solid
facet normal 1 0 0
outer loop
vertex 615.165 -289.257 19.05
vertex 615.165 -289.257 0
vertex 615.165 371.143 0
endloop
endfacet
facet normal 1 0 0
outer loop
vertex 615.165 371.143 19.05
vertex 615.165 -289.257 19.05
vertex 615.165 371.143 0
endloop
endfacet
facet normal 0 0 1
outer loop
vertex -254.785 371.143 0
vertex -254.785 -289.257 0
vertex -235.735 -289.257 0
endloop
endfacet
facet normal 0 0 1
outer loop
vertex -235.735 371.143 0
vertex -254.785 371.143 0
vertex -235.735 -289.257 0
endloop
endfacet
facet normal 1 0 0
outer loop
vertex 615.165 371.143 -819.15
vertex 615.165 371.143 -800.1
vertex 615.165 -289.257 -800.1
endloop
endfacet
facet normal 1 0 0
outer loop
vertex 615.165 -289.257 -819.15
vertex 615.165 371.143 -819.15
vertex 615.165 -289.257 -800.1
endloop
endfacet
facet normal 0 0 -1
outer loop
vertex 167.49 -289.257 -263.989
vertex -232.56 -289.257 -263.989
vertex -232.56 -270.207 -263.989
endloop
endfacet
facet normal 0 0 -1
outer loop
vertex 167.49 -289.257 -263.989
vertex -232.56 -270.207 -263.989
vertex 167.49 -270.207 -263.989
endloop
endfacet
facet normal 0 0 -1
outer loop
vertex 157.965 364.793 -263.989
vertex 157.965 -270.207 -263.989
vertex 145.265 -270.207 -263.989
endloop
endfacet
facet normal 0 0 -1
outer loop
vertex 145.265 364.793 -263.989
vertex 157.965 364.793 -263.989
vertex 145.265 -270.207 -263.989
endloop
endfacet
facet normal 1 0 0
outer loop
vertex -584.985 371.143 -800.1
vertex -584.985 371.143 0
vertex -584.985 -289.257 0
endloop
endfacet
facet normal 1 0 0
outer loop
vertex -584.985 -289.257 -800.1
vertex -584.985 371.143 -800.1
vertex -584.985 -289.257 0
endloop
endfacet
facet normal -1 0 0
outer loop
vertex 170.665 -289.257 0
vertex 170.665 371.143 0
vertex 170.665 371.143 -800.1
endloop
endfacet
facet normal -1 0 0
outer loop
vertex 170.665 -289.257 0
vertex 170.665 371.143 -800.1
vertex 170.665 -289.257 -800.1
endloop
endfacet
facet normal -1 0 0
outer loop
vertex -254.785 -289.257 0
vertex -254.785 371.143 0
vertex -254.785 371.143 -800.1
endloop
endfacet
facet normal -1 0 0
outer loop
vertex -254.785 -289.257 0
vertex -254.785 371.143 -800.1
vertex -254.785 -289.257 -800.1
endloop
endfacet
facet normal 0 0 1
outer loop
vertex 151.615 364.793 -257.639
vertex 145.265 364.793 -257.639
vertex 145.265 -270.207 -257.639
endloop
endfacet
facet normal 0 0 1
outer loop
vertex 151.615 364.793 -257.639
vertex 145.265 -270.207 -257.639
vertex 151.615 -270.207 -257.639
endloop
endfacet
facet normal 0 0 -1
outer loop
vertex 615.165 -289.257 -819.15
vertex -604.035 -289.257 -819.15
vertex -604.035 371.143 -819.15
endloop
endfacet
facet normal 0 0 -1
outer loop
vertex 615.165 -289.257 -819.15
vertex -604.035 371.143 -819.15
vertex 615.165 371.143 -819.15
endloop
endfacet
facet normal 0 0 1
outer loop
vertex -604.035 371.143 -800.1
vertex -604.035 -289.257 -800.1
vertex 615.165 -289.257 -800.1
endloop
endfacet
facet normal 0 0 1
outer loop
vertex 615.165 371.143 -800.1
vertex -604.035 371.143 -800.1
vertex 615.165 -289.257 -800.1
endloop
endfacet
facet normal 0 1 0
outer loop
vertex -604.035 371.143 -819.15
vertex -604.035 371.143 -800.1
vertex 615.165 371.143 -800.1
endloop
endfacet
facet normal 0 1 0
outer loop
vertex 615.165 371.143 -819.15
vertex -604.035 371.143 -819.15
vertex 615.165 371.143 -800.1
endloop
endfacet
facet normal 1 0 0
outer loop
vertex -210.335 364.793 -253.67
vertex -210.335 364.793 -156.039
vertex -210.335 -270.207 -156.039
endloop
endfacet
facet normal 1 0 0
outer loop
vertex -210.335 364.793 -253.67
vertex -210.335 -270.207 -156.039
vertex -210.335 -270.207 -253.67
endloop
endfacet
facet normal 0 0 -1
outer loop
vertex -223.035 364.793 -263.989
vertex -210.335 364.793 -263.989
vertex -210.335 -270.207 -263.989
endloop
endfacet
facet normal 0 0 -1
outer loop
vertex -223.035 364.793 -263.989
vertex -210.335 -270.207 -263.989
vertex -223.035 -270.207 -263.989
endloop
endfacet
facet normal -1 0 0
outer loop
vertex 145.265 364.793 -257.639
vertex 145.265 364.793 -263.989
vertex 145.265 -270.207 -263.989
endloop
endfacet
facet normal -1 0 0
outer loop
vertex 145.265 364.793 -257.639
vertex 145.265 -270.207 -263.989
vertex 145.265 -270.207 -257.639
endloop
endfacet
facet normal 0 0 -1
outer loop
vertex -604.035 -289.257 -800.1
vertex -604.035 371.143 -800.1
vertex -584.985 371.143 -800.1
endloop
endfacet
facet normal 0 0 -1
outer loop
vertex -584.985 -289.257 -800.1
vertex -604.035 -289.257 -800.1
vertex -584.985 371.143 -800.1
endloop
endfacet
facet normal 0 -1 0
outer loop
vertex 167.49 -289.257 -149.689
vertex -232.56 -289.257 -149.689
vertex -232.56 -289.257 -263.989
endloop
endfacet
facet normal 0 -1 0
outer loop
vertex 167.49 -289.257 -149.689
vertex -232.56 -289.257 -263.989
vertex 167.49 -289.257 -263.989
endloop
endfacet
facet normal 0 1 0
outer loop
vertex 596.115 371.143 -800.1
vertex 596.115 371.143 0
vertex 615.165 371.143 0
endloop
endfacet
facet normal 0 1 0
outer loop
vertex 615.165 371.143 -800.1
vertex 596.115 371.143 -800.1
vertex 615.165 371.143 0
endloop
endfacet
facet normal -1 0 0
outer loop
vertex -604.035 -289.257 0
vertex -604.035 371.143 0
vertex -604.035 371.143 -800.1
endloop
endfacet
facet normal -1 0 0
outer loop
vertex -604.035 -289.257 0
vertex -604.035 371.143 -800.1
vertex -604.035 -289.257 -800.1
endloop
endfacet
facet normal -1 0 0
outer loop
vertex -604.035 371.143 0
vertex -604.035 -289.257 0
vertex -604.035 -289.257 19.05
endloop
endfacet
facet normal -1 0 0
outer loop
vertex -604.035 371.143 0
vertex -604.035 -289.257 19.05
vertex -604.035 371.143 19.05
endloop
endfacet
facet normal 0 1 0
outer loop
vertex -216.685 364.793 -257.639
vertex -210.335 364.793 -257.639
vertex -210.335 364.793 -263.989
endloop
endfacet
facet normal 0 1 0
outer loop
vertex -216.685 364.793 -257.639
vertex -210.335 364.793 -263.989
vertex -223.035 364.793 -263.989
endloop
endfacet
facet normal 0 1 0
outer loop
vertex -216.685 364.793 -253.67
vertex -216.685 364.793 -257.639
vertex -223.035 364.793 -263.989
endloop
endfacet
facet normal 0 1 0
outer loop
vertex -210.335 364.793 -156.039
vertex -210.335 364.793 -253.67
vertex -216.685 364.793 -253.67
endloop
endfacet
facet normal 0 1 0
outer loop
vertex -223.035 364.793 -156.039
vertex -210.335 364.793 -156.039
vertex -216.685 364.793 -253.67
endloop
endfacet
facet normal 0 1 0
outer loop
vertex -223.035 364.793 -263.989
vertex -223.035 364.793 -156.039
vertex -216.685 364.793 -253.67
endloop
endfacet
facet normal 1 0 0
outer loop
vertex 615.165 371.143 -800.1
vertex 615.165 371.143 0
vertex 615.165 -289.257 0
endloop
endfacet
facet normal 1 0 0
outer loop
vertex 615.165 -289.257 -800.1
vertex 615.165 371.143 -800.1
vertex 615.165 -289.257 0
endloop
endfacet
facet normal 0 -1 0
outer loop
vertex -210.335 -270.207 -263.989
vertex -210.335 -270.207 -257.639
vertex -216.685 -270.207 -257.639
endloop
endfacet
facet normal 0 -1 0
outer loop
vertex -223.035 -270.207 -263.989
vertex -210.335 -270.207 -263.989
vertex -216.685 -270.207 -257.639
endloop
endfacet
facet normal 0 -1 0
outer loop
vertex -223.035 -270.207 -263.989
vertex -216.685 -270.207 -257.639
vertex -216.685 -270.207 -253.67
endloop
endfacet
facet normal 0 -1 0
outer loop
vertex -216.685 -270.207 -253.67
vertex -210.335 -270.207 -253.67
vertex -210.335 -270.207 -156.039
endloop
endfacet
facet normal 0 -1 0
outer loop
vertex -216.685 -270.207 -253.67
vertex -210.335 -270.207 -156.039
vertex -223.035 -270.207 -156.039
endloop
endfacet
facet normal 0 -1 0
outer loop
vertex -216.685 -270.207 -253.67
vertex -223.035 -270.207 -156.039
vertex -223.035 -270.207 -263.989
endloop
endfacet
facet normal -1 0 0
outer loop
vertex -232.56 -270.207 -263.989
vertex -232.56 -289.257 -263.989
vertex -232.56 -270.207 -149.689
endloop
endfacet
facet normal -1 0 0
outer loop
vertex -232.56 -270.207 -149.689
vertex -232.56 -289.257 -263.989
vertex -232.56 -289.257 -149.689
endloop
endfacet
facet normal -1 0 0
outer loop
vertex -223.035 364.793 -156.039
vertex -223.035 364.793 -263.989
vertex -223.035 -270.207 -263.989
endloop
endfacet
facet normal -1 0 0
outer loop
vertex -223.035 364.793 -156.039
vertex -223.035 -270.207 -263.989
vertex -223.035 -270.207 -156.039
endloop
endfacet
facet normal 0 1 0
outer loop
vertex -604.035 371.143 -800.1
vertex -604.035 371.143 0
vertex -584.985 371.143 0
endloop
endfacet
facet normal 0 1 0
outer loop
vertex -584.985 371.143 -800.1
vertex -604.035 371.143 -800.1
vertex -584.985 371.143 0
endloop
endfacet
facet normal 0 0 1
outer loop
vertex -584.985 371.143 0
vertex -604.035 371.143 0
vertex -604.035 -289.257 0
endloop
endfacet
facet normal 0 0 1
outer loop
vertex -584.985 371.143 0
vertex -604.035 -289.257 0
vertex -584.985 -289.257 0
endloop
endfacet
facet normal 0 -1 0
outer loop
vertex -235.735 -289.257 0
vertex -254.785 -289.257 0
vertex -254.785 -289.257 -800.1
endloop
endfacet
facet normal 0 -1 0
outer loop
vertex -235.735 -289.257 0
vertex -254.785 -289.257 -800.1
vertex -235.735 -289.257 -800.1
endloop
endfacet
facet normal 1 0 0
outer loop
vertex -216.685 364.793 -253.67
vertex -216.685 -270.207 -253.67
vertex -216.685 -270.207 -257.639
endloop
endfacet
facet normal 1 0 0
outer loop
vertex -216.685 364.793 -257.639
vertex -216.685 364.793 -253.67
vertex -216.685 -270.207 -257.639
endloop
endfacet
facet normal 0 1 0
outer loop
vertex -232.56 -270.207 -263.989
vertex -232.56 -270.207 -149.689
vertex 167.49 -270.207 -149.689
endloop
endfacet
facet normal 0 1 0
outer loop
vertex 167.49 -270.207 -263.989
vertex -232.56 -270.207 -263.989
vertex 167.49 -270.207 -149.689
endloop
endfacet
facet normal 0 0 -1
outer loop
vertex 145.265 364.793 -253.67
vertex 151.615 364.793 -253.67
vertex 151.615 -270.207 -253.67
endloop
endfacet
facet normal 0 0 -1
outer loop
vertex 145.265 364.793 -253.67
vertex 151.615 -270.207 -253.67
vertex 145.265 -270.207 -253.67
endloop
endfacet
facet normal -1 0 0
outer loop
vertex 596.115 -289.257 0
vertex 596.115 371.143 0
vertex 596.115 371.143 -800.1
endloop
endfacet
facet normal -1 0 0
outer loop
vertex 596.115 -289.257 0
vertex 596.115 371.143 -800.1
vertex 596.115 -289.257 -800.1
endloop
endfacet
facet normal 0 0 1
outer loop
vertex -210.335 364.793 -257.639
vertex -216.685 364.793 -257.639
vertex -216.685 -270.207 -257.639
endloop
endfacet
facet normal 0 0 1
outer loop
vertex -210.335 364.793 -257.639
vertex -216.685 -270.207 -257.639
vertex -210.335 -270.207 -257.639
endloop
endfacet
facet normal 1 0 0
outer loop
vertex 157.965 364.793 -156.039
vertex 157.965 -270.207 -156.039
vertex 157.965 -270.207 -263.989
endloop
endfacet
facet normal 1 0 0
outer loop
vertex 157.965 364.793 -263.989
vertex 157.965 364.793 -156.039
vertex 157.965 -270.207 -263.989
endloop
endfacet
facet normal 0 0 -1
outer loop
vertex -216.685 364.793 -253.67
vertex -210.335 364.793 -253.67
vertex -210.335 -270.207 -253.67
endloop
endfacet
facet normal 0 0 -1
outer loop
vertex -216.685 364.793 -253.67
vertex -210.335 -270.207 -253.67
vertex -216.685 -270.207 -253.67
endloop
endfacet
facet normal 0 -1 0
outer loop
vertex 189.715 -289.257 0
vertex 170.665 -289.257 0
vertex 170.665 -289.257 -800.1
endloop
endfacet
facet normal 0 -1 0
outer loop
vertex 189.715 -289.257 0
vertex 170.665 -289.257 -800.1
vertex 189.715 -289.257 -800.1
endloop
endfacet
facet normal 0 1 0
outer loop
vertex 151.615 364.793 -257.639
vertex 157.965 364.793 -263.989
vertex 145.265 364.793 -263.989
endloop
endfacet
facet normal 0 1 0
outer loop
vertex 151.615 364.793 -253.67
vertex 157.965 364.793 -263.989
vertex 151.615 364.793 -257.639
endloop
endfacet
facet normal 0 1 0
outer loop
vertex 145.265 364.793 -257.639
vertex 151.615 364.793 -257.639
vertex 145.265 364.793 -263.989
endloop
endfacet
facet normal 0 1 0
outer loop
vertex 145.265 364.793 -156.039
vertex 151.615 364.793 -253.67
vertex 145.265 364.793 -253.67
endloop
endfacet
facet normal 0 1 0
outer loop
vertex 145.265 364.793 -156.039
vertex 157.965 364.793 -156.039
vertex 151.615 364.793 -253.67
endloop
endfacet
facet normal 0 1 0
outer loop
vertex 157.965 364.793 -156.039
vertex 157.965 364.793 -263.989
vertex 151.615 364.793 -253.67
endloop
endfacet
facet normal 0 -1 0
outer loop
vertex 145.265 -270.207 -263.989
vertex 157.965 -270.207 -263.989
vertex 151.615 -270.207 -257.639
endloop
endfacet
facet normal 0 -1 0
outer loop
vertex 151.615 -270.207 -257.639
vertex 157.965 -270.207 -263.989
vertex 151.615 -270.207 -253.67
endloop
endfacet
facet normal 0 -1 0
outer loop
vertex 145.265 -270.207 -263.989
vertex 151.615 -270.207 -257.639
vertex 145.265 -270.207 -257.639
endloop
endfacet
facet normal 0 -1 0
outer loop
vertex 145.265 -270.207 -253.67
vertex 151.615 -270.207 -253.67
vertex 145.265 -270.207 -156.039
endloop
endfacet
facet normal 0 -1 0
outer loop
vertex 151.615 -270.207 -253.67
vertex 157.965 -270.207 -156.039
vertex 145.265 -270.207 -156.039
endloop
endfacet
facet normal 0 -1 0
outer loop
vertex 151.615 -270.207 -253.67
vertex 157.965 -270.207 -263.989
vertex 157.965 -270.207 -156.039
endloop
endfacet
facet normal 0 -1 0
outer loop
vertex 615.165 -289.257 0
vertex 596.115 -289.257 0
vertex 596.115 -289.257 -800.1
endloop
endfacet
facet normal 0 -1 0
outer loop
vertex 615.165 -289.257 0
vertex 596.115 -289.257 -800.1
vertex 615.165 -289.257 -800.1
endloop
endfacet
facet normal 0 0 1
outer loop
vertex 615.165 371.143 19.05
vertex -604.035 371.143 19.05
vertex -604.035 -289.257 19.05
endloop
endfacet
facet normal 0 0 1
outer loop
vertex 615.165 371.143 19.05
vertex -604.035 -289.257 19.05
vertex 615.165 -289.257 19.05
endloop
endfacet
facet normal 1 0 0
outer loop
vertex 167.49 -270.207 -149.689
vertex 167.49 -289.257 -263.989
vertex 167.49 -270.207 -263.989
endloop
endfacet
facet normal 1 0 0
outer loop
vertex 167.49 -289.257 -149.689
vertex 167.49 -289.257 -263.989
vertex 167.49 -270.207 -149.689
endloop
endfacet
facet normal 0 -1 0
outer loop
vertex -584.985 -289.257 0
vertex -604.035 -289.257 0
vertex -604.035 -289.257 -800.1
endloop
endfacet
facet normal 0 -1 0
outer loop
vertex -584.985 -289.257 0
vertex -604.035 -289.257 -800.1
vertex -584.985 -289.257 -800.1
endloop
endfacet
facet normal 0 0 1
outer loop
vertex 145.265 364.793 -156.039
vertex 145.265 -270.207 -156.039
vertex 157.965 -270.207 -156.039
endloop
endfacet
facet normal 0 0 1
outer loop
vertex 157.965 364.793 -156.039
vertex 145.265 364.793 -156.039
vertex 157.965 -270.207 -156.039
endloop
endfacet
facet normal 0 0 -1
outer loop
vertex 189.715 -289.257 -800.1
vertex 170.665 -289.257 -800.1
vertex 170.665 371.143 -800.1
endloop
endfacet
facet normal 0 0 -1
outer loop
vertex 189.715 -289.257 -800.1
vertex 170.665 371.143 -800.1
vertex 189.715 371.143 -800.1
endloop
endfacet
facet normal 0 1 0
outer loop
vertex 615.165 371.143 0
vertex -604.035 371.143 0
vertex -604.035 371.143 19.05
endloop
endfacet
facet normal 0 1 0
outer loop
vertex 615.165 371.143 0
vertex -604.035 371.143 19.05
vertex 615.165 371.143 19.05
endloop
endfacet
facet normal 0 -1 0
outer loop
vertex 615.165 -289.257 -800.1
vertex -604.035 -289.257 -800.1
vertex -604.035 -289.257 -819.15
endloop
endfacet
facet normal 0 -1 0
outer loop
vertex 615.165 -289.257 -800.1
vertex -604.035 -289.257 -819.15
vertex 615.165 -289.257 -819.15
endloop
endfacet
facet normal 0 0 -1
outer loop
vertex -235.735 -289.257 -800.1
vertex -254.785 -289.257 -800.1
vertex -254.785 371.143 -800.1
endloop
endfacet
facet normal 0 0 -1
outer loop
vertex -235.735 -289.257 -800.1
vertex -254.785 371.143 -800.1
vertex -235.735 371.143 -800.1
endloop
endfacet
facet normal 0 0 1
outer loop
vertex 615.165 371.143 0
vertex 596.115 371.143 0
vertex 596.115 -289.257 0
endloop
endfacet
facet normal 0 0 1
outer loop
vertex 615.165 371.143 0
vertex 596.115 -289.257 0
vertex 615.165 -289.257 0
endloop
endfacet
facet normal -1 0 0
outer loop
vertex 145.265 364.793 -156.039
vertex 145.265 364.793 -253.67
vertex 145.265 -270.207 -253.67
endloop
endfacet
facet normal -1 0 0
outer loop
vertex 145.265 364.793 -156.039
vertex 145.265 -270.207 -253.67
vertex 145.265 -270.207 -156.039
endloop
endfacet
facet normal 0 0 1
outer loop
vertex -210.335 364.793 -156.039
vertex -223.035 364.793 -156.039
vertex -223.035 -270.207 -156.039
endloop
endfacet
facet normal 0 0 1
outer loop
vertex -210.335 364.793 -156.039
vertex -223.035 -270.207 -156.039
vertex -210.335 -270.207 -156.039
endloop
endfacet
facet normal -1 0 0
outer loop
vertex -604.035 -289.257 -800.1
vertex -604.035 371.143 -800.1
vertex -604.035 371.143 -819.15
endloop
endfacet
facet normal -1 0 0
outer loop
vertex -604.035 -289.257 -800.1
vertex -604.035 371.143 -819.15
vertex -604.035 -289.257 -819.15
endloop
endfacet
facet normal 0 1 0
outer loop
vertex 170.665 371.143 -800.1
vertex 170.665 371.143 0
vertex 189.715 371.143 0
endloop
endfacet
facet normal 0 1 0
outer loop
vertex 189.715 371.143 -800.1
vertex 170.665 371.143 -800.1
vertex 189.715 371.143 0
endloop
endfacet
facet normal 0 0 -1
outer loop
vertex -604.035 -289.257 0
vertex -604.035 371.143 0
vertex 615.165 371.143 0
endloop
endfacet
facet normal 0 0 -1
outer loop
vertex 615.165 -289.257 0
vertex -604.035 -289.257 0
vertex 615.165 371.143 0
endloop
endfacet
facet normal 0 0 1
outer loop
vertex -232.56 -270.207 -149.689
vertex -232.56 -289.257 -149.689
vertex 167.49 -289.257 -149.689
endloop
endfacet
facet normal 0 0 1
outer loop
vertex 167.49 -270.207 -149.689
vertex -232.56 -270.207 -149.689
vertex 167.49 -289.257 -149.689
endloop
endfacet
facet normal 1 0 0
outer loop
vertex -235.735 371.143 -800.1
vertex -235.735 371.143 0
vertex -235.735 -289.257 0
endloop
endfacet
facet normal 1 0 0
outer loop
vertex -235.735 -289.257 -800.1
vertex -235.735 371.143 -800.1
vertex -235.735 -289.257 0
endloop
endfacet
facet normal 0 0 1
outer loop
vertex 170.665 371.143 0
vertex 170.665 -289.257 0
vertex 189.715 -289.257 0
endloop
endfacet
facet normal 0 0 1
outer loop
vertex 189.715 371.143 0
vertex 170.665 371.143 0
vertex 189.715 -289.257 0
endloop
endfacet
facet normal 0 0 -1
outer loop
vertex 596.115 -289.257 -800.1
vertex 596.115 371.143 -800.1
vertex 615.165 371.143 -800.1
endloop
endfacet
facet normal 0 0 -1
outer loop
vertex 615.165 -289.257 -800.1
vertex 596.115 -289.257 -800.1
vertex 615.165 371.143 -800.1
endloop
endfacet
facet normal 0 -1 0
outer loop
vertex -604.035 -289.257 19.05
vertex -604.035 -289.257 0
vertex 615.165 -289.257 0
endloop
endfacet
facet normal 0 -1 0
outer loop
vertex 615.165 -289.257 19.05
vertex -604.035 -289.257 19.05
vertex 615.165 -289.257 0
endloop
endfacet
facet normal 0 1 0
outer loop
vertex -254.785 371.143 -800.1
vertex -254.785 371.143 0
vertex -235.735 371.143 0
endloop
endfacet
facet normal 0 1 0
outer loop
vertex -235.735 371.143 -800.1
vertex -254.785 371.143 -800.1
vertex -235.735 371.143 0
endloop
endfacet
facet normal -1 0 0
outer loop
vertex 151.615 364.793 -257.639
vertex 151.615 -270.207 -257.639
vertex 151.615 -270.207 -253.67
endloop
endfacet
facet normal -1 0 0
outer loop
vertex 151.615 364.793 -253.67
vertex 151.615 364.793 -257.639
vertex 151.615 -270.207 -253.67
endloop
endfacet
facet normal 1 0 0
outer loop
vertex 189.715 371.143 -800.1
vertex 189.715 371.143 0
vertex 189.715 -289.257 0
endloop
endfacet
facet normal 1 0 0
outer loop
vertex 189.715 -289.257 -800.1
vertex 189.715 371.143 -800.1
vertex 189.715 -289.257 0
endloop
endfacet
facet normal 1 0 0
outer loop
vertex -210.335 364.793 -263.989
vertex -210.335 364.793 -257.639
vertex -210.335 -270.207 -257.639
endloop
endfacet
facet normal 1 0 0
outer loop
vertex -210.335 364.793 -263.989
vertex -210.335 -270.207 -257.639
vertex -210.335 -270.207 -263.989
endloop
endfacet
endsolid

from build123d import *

# Parameters (mm, degrees)
F0_W     = 1219.2
F0_H     = 660.4
F1_DEPTH = 19.05
F2_W     = 19.05
F2_H     = 660.4
F3_DEPTH = 800.1
F4_W     = 1219.2
F4_H     = 660.4
F5_DEPTH = 19.05
F6_W     = 400.05
F6_H     = 114.3
F7_DEPTH = 19.05
F9_DEPTH = 635


# Not quite as in the source:
# - a length typed as a fraction of an inch, garbled in the dataset ("3 / 203.2 mm" for 3/8 in), is restored


with BuildPart() as f1:
    # F0 (on Top) → F1 (new body)
    with BuildSketch(Plane.XY):
        with Locations((5.564596504, 40.9429918908)):
            Rectangle(F0_W, F0_H)
    extrude(amount=F1_DEPTH)


with BuildPart() as f3:
    # F2 (on face) → F3 (new body)
    with BuildSketch(Plane(origin=(0, 0, 0), x_dir=(1, 0, 0), z_dir=(0, 0, -1))):
        with Locations((-594.510403496, -40.9429918908)):
            Rectangle(F2_W, F2_H)
    extrude(amount=F3_DEPTH)


with BuildPart() as f3b:
    # F2 (on face) → F3, piece 2 (new body)
    with BuildSketch(Plane(origin=(0, 0, 0), x_dir=(1, 0, 0), z_dir=(0, 0, -1))):
        with Locations((605.639596504, -40.9429918908)):
            Rectangle(F2_W, F2_H)
    extrude(amount=F3_DEPTH)


with BuildPart() as f3c:
    # F2 (on face) → F3, piece 3 (new body)
    with BuildSketch(Plane(origin=(0, 0, 0), x_dir=(1, 0, 0), z_dir=(0, 0, -1))):
        with Locations((180.189596504, -40.9429918908)):
            Rectangle(F2_W, F2_H)
    extrude(amount=F3_DEPTH)


with BuildPart() as f3d:
    # F2 (on face) → F3, piece 4 (new body)
    with BuildSketch(Plane(origin=(0, 0, 0), x_dir=(1, 0, 0), z_dir=(0, 0, -1))):
        with Locations((-245.260403496, -40.9429918908)):
            Rectangle(F2_W, F2_H)
    extrude(amount=F3_DEPTH)


with BuildPart() as f5:
    # F4 (on face) → F5 (new body)
    with BuildSketch(Plane(origin=(0, 0, -800.1), x_dir=(1, 0, 0), z_dir=(0, 0, -1))):
        with Locations((5.564596504, -40.9429918908)):
            Rectangle(F4_W, F4_H)
    extrude(amount=F5_DEPTH)


with BuildPart() as f7:
    # F6 (on face) → F7 (new body)
    with BuildSketch(Plane.XZ.offset(289.2570081092)):
        with Locations((-32.535403496, -206.838673687)):
            Rectangle(F6_W, F6_H)
    extrude(amount=-F7_DEPTH)


with BuildPart() as f9:
    # F8 (on face) → F9 (new body)
    with BuildSketch(Plane(origin=(0, -270.2070081092, 0), x_dir=(-1, 0, 0), z_dir=(0, 1, 0))):
        Polygon((-145.264596504, -156.038673687), (-157.964596504, -156.038673687), (-157.964596504, -263.988673687), (-145.264596504, -263.988673687), (-145.264596504, -257.638673687), (-151.614596504, -257.638673687), (-151.614596504, -253.669923687), (-145.264596504, -253.669923687), align=None)
    extrude(amount=F9_DEPTH)


with BuildPart() as f9b:
    # F8 (on face) → F9, piece 2 (new body)
    with BuildSketch(Plane(origin=(0, -270.2070081092, 0), x_dir=(-1, 0, 0), z_dir=(0, 1, 0))):
        Polygon((216.685403496, -253.669923687), (216.685403496, -257.638673687), (210.335403496, -257.638673687), (210.335403496, -263.988673687), (223.035403496, -263.988673687), (223.035403496, -156.038673687), (210.335403496, -156.038673687), (210.335403496, -253.669923687), align=None)
    extrude(amount=F9_DEPTH)


solid = Compound([f1.part, f3.part, f3b.part, f3c.part, f3d.part, f5.part, f7.part, f9.part, f9b.part])
